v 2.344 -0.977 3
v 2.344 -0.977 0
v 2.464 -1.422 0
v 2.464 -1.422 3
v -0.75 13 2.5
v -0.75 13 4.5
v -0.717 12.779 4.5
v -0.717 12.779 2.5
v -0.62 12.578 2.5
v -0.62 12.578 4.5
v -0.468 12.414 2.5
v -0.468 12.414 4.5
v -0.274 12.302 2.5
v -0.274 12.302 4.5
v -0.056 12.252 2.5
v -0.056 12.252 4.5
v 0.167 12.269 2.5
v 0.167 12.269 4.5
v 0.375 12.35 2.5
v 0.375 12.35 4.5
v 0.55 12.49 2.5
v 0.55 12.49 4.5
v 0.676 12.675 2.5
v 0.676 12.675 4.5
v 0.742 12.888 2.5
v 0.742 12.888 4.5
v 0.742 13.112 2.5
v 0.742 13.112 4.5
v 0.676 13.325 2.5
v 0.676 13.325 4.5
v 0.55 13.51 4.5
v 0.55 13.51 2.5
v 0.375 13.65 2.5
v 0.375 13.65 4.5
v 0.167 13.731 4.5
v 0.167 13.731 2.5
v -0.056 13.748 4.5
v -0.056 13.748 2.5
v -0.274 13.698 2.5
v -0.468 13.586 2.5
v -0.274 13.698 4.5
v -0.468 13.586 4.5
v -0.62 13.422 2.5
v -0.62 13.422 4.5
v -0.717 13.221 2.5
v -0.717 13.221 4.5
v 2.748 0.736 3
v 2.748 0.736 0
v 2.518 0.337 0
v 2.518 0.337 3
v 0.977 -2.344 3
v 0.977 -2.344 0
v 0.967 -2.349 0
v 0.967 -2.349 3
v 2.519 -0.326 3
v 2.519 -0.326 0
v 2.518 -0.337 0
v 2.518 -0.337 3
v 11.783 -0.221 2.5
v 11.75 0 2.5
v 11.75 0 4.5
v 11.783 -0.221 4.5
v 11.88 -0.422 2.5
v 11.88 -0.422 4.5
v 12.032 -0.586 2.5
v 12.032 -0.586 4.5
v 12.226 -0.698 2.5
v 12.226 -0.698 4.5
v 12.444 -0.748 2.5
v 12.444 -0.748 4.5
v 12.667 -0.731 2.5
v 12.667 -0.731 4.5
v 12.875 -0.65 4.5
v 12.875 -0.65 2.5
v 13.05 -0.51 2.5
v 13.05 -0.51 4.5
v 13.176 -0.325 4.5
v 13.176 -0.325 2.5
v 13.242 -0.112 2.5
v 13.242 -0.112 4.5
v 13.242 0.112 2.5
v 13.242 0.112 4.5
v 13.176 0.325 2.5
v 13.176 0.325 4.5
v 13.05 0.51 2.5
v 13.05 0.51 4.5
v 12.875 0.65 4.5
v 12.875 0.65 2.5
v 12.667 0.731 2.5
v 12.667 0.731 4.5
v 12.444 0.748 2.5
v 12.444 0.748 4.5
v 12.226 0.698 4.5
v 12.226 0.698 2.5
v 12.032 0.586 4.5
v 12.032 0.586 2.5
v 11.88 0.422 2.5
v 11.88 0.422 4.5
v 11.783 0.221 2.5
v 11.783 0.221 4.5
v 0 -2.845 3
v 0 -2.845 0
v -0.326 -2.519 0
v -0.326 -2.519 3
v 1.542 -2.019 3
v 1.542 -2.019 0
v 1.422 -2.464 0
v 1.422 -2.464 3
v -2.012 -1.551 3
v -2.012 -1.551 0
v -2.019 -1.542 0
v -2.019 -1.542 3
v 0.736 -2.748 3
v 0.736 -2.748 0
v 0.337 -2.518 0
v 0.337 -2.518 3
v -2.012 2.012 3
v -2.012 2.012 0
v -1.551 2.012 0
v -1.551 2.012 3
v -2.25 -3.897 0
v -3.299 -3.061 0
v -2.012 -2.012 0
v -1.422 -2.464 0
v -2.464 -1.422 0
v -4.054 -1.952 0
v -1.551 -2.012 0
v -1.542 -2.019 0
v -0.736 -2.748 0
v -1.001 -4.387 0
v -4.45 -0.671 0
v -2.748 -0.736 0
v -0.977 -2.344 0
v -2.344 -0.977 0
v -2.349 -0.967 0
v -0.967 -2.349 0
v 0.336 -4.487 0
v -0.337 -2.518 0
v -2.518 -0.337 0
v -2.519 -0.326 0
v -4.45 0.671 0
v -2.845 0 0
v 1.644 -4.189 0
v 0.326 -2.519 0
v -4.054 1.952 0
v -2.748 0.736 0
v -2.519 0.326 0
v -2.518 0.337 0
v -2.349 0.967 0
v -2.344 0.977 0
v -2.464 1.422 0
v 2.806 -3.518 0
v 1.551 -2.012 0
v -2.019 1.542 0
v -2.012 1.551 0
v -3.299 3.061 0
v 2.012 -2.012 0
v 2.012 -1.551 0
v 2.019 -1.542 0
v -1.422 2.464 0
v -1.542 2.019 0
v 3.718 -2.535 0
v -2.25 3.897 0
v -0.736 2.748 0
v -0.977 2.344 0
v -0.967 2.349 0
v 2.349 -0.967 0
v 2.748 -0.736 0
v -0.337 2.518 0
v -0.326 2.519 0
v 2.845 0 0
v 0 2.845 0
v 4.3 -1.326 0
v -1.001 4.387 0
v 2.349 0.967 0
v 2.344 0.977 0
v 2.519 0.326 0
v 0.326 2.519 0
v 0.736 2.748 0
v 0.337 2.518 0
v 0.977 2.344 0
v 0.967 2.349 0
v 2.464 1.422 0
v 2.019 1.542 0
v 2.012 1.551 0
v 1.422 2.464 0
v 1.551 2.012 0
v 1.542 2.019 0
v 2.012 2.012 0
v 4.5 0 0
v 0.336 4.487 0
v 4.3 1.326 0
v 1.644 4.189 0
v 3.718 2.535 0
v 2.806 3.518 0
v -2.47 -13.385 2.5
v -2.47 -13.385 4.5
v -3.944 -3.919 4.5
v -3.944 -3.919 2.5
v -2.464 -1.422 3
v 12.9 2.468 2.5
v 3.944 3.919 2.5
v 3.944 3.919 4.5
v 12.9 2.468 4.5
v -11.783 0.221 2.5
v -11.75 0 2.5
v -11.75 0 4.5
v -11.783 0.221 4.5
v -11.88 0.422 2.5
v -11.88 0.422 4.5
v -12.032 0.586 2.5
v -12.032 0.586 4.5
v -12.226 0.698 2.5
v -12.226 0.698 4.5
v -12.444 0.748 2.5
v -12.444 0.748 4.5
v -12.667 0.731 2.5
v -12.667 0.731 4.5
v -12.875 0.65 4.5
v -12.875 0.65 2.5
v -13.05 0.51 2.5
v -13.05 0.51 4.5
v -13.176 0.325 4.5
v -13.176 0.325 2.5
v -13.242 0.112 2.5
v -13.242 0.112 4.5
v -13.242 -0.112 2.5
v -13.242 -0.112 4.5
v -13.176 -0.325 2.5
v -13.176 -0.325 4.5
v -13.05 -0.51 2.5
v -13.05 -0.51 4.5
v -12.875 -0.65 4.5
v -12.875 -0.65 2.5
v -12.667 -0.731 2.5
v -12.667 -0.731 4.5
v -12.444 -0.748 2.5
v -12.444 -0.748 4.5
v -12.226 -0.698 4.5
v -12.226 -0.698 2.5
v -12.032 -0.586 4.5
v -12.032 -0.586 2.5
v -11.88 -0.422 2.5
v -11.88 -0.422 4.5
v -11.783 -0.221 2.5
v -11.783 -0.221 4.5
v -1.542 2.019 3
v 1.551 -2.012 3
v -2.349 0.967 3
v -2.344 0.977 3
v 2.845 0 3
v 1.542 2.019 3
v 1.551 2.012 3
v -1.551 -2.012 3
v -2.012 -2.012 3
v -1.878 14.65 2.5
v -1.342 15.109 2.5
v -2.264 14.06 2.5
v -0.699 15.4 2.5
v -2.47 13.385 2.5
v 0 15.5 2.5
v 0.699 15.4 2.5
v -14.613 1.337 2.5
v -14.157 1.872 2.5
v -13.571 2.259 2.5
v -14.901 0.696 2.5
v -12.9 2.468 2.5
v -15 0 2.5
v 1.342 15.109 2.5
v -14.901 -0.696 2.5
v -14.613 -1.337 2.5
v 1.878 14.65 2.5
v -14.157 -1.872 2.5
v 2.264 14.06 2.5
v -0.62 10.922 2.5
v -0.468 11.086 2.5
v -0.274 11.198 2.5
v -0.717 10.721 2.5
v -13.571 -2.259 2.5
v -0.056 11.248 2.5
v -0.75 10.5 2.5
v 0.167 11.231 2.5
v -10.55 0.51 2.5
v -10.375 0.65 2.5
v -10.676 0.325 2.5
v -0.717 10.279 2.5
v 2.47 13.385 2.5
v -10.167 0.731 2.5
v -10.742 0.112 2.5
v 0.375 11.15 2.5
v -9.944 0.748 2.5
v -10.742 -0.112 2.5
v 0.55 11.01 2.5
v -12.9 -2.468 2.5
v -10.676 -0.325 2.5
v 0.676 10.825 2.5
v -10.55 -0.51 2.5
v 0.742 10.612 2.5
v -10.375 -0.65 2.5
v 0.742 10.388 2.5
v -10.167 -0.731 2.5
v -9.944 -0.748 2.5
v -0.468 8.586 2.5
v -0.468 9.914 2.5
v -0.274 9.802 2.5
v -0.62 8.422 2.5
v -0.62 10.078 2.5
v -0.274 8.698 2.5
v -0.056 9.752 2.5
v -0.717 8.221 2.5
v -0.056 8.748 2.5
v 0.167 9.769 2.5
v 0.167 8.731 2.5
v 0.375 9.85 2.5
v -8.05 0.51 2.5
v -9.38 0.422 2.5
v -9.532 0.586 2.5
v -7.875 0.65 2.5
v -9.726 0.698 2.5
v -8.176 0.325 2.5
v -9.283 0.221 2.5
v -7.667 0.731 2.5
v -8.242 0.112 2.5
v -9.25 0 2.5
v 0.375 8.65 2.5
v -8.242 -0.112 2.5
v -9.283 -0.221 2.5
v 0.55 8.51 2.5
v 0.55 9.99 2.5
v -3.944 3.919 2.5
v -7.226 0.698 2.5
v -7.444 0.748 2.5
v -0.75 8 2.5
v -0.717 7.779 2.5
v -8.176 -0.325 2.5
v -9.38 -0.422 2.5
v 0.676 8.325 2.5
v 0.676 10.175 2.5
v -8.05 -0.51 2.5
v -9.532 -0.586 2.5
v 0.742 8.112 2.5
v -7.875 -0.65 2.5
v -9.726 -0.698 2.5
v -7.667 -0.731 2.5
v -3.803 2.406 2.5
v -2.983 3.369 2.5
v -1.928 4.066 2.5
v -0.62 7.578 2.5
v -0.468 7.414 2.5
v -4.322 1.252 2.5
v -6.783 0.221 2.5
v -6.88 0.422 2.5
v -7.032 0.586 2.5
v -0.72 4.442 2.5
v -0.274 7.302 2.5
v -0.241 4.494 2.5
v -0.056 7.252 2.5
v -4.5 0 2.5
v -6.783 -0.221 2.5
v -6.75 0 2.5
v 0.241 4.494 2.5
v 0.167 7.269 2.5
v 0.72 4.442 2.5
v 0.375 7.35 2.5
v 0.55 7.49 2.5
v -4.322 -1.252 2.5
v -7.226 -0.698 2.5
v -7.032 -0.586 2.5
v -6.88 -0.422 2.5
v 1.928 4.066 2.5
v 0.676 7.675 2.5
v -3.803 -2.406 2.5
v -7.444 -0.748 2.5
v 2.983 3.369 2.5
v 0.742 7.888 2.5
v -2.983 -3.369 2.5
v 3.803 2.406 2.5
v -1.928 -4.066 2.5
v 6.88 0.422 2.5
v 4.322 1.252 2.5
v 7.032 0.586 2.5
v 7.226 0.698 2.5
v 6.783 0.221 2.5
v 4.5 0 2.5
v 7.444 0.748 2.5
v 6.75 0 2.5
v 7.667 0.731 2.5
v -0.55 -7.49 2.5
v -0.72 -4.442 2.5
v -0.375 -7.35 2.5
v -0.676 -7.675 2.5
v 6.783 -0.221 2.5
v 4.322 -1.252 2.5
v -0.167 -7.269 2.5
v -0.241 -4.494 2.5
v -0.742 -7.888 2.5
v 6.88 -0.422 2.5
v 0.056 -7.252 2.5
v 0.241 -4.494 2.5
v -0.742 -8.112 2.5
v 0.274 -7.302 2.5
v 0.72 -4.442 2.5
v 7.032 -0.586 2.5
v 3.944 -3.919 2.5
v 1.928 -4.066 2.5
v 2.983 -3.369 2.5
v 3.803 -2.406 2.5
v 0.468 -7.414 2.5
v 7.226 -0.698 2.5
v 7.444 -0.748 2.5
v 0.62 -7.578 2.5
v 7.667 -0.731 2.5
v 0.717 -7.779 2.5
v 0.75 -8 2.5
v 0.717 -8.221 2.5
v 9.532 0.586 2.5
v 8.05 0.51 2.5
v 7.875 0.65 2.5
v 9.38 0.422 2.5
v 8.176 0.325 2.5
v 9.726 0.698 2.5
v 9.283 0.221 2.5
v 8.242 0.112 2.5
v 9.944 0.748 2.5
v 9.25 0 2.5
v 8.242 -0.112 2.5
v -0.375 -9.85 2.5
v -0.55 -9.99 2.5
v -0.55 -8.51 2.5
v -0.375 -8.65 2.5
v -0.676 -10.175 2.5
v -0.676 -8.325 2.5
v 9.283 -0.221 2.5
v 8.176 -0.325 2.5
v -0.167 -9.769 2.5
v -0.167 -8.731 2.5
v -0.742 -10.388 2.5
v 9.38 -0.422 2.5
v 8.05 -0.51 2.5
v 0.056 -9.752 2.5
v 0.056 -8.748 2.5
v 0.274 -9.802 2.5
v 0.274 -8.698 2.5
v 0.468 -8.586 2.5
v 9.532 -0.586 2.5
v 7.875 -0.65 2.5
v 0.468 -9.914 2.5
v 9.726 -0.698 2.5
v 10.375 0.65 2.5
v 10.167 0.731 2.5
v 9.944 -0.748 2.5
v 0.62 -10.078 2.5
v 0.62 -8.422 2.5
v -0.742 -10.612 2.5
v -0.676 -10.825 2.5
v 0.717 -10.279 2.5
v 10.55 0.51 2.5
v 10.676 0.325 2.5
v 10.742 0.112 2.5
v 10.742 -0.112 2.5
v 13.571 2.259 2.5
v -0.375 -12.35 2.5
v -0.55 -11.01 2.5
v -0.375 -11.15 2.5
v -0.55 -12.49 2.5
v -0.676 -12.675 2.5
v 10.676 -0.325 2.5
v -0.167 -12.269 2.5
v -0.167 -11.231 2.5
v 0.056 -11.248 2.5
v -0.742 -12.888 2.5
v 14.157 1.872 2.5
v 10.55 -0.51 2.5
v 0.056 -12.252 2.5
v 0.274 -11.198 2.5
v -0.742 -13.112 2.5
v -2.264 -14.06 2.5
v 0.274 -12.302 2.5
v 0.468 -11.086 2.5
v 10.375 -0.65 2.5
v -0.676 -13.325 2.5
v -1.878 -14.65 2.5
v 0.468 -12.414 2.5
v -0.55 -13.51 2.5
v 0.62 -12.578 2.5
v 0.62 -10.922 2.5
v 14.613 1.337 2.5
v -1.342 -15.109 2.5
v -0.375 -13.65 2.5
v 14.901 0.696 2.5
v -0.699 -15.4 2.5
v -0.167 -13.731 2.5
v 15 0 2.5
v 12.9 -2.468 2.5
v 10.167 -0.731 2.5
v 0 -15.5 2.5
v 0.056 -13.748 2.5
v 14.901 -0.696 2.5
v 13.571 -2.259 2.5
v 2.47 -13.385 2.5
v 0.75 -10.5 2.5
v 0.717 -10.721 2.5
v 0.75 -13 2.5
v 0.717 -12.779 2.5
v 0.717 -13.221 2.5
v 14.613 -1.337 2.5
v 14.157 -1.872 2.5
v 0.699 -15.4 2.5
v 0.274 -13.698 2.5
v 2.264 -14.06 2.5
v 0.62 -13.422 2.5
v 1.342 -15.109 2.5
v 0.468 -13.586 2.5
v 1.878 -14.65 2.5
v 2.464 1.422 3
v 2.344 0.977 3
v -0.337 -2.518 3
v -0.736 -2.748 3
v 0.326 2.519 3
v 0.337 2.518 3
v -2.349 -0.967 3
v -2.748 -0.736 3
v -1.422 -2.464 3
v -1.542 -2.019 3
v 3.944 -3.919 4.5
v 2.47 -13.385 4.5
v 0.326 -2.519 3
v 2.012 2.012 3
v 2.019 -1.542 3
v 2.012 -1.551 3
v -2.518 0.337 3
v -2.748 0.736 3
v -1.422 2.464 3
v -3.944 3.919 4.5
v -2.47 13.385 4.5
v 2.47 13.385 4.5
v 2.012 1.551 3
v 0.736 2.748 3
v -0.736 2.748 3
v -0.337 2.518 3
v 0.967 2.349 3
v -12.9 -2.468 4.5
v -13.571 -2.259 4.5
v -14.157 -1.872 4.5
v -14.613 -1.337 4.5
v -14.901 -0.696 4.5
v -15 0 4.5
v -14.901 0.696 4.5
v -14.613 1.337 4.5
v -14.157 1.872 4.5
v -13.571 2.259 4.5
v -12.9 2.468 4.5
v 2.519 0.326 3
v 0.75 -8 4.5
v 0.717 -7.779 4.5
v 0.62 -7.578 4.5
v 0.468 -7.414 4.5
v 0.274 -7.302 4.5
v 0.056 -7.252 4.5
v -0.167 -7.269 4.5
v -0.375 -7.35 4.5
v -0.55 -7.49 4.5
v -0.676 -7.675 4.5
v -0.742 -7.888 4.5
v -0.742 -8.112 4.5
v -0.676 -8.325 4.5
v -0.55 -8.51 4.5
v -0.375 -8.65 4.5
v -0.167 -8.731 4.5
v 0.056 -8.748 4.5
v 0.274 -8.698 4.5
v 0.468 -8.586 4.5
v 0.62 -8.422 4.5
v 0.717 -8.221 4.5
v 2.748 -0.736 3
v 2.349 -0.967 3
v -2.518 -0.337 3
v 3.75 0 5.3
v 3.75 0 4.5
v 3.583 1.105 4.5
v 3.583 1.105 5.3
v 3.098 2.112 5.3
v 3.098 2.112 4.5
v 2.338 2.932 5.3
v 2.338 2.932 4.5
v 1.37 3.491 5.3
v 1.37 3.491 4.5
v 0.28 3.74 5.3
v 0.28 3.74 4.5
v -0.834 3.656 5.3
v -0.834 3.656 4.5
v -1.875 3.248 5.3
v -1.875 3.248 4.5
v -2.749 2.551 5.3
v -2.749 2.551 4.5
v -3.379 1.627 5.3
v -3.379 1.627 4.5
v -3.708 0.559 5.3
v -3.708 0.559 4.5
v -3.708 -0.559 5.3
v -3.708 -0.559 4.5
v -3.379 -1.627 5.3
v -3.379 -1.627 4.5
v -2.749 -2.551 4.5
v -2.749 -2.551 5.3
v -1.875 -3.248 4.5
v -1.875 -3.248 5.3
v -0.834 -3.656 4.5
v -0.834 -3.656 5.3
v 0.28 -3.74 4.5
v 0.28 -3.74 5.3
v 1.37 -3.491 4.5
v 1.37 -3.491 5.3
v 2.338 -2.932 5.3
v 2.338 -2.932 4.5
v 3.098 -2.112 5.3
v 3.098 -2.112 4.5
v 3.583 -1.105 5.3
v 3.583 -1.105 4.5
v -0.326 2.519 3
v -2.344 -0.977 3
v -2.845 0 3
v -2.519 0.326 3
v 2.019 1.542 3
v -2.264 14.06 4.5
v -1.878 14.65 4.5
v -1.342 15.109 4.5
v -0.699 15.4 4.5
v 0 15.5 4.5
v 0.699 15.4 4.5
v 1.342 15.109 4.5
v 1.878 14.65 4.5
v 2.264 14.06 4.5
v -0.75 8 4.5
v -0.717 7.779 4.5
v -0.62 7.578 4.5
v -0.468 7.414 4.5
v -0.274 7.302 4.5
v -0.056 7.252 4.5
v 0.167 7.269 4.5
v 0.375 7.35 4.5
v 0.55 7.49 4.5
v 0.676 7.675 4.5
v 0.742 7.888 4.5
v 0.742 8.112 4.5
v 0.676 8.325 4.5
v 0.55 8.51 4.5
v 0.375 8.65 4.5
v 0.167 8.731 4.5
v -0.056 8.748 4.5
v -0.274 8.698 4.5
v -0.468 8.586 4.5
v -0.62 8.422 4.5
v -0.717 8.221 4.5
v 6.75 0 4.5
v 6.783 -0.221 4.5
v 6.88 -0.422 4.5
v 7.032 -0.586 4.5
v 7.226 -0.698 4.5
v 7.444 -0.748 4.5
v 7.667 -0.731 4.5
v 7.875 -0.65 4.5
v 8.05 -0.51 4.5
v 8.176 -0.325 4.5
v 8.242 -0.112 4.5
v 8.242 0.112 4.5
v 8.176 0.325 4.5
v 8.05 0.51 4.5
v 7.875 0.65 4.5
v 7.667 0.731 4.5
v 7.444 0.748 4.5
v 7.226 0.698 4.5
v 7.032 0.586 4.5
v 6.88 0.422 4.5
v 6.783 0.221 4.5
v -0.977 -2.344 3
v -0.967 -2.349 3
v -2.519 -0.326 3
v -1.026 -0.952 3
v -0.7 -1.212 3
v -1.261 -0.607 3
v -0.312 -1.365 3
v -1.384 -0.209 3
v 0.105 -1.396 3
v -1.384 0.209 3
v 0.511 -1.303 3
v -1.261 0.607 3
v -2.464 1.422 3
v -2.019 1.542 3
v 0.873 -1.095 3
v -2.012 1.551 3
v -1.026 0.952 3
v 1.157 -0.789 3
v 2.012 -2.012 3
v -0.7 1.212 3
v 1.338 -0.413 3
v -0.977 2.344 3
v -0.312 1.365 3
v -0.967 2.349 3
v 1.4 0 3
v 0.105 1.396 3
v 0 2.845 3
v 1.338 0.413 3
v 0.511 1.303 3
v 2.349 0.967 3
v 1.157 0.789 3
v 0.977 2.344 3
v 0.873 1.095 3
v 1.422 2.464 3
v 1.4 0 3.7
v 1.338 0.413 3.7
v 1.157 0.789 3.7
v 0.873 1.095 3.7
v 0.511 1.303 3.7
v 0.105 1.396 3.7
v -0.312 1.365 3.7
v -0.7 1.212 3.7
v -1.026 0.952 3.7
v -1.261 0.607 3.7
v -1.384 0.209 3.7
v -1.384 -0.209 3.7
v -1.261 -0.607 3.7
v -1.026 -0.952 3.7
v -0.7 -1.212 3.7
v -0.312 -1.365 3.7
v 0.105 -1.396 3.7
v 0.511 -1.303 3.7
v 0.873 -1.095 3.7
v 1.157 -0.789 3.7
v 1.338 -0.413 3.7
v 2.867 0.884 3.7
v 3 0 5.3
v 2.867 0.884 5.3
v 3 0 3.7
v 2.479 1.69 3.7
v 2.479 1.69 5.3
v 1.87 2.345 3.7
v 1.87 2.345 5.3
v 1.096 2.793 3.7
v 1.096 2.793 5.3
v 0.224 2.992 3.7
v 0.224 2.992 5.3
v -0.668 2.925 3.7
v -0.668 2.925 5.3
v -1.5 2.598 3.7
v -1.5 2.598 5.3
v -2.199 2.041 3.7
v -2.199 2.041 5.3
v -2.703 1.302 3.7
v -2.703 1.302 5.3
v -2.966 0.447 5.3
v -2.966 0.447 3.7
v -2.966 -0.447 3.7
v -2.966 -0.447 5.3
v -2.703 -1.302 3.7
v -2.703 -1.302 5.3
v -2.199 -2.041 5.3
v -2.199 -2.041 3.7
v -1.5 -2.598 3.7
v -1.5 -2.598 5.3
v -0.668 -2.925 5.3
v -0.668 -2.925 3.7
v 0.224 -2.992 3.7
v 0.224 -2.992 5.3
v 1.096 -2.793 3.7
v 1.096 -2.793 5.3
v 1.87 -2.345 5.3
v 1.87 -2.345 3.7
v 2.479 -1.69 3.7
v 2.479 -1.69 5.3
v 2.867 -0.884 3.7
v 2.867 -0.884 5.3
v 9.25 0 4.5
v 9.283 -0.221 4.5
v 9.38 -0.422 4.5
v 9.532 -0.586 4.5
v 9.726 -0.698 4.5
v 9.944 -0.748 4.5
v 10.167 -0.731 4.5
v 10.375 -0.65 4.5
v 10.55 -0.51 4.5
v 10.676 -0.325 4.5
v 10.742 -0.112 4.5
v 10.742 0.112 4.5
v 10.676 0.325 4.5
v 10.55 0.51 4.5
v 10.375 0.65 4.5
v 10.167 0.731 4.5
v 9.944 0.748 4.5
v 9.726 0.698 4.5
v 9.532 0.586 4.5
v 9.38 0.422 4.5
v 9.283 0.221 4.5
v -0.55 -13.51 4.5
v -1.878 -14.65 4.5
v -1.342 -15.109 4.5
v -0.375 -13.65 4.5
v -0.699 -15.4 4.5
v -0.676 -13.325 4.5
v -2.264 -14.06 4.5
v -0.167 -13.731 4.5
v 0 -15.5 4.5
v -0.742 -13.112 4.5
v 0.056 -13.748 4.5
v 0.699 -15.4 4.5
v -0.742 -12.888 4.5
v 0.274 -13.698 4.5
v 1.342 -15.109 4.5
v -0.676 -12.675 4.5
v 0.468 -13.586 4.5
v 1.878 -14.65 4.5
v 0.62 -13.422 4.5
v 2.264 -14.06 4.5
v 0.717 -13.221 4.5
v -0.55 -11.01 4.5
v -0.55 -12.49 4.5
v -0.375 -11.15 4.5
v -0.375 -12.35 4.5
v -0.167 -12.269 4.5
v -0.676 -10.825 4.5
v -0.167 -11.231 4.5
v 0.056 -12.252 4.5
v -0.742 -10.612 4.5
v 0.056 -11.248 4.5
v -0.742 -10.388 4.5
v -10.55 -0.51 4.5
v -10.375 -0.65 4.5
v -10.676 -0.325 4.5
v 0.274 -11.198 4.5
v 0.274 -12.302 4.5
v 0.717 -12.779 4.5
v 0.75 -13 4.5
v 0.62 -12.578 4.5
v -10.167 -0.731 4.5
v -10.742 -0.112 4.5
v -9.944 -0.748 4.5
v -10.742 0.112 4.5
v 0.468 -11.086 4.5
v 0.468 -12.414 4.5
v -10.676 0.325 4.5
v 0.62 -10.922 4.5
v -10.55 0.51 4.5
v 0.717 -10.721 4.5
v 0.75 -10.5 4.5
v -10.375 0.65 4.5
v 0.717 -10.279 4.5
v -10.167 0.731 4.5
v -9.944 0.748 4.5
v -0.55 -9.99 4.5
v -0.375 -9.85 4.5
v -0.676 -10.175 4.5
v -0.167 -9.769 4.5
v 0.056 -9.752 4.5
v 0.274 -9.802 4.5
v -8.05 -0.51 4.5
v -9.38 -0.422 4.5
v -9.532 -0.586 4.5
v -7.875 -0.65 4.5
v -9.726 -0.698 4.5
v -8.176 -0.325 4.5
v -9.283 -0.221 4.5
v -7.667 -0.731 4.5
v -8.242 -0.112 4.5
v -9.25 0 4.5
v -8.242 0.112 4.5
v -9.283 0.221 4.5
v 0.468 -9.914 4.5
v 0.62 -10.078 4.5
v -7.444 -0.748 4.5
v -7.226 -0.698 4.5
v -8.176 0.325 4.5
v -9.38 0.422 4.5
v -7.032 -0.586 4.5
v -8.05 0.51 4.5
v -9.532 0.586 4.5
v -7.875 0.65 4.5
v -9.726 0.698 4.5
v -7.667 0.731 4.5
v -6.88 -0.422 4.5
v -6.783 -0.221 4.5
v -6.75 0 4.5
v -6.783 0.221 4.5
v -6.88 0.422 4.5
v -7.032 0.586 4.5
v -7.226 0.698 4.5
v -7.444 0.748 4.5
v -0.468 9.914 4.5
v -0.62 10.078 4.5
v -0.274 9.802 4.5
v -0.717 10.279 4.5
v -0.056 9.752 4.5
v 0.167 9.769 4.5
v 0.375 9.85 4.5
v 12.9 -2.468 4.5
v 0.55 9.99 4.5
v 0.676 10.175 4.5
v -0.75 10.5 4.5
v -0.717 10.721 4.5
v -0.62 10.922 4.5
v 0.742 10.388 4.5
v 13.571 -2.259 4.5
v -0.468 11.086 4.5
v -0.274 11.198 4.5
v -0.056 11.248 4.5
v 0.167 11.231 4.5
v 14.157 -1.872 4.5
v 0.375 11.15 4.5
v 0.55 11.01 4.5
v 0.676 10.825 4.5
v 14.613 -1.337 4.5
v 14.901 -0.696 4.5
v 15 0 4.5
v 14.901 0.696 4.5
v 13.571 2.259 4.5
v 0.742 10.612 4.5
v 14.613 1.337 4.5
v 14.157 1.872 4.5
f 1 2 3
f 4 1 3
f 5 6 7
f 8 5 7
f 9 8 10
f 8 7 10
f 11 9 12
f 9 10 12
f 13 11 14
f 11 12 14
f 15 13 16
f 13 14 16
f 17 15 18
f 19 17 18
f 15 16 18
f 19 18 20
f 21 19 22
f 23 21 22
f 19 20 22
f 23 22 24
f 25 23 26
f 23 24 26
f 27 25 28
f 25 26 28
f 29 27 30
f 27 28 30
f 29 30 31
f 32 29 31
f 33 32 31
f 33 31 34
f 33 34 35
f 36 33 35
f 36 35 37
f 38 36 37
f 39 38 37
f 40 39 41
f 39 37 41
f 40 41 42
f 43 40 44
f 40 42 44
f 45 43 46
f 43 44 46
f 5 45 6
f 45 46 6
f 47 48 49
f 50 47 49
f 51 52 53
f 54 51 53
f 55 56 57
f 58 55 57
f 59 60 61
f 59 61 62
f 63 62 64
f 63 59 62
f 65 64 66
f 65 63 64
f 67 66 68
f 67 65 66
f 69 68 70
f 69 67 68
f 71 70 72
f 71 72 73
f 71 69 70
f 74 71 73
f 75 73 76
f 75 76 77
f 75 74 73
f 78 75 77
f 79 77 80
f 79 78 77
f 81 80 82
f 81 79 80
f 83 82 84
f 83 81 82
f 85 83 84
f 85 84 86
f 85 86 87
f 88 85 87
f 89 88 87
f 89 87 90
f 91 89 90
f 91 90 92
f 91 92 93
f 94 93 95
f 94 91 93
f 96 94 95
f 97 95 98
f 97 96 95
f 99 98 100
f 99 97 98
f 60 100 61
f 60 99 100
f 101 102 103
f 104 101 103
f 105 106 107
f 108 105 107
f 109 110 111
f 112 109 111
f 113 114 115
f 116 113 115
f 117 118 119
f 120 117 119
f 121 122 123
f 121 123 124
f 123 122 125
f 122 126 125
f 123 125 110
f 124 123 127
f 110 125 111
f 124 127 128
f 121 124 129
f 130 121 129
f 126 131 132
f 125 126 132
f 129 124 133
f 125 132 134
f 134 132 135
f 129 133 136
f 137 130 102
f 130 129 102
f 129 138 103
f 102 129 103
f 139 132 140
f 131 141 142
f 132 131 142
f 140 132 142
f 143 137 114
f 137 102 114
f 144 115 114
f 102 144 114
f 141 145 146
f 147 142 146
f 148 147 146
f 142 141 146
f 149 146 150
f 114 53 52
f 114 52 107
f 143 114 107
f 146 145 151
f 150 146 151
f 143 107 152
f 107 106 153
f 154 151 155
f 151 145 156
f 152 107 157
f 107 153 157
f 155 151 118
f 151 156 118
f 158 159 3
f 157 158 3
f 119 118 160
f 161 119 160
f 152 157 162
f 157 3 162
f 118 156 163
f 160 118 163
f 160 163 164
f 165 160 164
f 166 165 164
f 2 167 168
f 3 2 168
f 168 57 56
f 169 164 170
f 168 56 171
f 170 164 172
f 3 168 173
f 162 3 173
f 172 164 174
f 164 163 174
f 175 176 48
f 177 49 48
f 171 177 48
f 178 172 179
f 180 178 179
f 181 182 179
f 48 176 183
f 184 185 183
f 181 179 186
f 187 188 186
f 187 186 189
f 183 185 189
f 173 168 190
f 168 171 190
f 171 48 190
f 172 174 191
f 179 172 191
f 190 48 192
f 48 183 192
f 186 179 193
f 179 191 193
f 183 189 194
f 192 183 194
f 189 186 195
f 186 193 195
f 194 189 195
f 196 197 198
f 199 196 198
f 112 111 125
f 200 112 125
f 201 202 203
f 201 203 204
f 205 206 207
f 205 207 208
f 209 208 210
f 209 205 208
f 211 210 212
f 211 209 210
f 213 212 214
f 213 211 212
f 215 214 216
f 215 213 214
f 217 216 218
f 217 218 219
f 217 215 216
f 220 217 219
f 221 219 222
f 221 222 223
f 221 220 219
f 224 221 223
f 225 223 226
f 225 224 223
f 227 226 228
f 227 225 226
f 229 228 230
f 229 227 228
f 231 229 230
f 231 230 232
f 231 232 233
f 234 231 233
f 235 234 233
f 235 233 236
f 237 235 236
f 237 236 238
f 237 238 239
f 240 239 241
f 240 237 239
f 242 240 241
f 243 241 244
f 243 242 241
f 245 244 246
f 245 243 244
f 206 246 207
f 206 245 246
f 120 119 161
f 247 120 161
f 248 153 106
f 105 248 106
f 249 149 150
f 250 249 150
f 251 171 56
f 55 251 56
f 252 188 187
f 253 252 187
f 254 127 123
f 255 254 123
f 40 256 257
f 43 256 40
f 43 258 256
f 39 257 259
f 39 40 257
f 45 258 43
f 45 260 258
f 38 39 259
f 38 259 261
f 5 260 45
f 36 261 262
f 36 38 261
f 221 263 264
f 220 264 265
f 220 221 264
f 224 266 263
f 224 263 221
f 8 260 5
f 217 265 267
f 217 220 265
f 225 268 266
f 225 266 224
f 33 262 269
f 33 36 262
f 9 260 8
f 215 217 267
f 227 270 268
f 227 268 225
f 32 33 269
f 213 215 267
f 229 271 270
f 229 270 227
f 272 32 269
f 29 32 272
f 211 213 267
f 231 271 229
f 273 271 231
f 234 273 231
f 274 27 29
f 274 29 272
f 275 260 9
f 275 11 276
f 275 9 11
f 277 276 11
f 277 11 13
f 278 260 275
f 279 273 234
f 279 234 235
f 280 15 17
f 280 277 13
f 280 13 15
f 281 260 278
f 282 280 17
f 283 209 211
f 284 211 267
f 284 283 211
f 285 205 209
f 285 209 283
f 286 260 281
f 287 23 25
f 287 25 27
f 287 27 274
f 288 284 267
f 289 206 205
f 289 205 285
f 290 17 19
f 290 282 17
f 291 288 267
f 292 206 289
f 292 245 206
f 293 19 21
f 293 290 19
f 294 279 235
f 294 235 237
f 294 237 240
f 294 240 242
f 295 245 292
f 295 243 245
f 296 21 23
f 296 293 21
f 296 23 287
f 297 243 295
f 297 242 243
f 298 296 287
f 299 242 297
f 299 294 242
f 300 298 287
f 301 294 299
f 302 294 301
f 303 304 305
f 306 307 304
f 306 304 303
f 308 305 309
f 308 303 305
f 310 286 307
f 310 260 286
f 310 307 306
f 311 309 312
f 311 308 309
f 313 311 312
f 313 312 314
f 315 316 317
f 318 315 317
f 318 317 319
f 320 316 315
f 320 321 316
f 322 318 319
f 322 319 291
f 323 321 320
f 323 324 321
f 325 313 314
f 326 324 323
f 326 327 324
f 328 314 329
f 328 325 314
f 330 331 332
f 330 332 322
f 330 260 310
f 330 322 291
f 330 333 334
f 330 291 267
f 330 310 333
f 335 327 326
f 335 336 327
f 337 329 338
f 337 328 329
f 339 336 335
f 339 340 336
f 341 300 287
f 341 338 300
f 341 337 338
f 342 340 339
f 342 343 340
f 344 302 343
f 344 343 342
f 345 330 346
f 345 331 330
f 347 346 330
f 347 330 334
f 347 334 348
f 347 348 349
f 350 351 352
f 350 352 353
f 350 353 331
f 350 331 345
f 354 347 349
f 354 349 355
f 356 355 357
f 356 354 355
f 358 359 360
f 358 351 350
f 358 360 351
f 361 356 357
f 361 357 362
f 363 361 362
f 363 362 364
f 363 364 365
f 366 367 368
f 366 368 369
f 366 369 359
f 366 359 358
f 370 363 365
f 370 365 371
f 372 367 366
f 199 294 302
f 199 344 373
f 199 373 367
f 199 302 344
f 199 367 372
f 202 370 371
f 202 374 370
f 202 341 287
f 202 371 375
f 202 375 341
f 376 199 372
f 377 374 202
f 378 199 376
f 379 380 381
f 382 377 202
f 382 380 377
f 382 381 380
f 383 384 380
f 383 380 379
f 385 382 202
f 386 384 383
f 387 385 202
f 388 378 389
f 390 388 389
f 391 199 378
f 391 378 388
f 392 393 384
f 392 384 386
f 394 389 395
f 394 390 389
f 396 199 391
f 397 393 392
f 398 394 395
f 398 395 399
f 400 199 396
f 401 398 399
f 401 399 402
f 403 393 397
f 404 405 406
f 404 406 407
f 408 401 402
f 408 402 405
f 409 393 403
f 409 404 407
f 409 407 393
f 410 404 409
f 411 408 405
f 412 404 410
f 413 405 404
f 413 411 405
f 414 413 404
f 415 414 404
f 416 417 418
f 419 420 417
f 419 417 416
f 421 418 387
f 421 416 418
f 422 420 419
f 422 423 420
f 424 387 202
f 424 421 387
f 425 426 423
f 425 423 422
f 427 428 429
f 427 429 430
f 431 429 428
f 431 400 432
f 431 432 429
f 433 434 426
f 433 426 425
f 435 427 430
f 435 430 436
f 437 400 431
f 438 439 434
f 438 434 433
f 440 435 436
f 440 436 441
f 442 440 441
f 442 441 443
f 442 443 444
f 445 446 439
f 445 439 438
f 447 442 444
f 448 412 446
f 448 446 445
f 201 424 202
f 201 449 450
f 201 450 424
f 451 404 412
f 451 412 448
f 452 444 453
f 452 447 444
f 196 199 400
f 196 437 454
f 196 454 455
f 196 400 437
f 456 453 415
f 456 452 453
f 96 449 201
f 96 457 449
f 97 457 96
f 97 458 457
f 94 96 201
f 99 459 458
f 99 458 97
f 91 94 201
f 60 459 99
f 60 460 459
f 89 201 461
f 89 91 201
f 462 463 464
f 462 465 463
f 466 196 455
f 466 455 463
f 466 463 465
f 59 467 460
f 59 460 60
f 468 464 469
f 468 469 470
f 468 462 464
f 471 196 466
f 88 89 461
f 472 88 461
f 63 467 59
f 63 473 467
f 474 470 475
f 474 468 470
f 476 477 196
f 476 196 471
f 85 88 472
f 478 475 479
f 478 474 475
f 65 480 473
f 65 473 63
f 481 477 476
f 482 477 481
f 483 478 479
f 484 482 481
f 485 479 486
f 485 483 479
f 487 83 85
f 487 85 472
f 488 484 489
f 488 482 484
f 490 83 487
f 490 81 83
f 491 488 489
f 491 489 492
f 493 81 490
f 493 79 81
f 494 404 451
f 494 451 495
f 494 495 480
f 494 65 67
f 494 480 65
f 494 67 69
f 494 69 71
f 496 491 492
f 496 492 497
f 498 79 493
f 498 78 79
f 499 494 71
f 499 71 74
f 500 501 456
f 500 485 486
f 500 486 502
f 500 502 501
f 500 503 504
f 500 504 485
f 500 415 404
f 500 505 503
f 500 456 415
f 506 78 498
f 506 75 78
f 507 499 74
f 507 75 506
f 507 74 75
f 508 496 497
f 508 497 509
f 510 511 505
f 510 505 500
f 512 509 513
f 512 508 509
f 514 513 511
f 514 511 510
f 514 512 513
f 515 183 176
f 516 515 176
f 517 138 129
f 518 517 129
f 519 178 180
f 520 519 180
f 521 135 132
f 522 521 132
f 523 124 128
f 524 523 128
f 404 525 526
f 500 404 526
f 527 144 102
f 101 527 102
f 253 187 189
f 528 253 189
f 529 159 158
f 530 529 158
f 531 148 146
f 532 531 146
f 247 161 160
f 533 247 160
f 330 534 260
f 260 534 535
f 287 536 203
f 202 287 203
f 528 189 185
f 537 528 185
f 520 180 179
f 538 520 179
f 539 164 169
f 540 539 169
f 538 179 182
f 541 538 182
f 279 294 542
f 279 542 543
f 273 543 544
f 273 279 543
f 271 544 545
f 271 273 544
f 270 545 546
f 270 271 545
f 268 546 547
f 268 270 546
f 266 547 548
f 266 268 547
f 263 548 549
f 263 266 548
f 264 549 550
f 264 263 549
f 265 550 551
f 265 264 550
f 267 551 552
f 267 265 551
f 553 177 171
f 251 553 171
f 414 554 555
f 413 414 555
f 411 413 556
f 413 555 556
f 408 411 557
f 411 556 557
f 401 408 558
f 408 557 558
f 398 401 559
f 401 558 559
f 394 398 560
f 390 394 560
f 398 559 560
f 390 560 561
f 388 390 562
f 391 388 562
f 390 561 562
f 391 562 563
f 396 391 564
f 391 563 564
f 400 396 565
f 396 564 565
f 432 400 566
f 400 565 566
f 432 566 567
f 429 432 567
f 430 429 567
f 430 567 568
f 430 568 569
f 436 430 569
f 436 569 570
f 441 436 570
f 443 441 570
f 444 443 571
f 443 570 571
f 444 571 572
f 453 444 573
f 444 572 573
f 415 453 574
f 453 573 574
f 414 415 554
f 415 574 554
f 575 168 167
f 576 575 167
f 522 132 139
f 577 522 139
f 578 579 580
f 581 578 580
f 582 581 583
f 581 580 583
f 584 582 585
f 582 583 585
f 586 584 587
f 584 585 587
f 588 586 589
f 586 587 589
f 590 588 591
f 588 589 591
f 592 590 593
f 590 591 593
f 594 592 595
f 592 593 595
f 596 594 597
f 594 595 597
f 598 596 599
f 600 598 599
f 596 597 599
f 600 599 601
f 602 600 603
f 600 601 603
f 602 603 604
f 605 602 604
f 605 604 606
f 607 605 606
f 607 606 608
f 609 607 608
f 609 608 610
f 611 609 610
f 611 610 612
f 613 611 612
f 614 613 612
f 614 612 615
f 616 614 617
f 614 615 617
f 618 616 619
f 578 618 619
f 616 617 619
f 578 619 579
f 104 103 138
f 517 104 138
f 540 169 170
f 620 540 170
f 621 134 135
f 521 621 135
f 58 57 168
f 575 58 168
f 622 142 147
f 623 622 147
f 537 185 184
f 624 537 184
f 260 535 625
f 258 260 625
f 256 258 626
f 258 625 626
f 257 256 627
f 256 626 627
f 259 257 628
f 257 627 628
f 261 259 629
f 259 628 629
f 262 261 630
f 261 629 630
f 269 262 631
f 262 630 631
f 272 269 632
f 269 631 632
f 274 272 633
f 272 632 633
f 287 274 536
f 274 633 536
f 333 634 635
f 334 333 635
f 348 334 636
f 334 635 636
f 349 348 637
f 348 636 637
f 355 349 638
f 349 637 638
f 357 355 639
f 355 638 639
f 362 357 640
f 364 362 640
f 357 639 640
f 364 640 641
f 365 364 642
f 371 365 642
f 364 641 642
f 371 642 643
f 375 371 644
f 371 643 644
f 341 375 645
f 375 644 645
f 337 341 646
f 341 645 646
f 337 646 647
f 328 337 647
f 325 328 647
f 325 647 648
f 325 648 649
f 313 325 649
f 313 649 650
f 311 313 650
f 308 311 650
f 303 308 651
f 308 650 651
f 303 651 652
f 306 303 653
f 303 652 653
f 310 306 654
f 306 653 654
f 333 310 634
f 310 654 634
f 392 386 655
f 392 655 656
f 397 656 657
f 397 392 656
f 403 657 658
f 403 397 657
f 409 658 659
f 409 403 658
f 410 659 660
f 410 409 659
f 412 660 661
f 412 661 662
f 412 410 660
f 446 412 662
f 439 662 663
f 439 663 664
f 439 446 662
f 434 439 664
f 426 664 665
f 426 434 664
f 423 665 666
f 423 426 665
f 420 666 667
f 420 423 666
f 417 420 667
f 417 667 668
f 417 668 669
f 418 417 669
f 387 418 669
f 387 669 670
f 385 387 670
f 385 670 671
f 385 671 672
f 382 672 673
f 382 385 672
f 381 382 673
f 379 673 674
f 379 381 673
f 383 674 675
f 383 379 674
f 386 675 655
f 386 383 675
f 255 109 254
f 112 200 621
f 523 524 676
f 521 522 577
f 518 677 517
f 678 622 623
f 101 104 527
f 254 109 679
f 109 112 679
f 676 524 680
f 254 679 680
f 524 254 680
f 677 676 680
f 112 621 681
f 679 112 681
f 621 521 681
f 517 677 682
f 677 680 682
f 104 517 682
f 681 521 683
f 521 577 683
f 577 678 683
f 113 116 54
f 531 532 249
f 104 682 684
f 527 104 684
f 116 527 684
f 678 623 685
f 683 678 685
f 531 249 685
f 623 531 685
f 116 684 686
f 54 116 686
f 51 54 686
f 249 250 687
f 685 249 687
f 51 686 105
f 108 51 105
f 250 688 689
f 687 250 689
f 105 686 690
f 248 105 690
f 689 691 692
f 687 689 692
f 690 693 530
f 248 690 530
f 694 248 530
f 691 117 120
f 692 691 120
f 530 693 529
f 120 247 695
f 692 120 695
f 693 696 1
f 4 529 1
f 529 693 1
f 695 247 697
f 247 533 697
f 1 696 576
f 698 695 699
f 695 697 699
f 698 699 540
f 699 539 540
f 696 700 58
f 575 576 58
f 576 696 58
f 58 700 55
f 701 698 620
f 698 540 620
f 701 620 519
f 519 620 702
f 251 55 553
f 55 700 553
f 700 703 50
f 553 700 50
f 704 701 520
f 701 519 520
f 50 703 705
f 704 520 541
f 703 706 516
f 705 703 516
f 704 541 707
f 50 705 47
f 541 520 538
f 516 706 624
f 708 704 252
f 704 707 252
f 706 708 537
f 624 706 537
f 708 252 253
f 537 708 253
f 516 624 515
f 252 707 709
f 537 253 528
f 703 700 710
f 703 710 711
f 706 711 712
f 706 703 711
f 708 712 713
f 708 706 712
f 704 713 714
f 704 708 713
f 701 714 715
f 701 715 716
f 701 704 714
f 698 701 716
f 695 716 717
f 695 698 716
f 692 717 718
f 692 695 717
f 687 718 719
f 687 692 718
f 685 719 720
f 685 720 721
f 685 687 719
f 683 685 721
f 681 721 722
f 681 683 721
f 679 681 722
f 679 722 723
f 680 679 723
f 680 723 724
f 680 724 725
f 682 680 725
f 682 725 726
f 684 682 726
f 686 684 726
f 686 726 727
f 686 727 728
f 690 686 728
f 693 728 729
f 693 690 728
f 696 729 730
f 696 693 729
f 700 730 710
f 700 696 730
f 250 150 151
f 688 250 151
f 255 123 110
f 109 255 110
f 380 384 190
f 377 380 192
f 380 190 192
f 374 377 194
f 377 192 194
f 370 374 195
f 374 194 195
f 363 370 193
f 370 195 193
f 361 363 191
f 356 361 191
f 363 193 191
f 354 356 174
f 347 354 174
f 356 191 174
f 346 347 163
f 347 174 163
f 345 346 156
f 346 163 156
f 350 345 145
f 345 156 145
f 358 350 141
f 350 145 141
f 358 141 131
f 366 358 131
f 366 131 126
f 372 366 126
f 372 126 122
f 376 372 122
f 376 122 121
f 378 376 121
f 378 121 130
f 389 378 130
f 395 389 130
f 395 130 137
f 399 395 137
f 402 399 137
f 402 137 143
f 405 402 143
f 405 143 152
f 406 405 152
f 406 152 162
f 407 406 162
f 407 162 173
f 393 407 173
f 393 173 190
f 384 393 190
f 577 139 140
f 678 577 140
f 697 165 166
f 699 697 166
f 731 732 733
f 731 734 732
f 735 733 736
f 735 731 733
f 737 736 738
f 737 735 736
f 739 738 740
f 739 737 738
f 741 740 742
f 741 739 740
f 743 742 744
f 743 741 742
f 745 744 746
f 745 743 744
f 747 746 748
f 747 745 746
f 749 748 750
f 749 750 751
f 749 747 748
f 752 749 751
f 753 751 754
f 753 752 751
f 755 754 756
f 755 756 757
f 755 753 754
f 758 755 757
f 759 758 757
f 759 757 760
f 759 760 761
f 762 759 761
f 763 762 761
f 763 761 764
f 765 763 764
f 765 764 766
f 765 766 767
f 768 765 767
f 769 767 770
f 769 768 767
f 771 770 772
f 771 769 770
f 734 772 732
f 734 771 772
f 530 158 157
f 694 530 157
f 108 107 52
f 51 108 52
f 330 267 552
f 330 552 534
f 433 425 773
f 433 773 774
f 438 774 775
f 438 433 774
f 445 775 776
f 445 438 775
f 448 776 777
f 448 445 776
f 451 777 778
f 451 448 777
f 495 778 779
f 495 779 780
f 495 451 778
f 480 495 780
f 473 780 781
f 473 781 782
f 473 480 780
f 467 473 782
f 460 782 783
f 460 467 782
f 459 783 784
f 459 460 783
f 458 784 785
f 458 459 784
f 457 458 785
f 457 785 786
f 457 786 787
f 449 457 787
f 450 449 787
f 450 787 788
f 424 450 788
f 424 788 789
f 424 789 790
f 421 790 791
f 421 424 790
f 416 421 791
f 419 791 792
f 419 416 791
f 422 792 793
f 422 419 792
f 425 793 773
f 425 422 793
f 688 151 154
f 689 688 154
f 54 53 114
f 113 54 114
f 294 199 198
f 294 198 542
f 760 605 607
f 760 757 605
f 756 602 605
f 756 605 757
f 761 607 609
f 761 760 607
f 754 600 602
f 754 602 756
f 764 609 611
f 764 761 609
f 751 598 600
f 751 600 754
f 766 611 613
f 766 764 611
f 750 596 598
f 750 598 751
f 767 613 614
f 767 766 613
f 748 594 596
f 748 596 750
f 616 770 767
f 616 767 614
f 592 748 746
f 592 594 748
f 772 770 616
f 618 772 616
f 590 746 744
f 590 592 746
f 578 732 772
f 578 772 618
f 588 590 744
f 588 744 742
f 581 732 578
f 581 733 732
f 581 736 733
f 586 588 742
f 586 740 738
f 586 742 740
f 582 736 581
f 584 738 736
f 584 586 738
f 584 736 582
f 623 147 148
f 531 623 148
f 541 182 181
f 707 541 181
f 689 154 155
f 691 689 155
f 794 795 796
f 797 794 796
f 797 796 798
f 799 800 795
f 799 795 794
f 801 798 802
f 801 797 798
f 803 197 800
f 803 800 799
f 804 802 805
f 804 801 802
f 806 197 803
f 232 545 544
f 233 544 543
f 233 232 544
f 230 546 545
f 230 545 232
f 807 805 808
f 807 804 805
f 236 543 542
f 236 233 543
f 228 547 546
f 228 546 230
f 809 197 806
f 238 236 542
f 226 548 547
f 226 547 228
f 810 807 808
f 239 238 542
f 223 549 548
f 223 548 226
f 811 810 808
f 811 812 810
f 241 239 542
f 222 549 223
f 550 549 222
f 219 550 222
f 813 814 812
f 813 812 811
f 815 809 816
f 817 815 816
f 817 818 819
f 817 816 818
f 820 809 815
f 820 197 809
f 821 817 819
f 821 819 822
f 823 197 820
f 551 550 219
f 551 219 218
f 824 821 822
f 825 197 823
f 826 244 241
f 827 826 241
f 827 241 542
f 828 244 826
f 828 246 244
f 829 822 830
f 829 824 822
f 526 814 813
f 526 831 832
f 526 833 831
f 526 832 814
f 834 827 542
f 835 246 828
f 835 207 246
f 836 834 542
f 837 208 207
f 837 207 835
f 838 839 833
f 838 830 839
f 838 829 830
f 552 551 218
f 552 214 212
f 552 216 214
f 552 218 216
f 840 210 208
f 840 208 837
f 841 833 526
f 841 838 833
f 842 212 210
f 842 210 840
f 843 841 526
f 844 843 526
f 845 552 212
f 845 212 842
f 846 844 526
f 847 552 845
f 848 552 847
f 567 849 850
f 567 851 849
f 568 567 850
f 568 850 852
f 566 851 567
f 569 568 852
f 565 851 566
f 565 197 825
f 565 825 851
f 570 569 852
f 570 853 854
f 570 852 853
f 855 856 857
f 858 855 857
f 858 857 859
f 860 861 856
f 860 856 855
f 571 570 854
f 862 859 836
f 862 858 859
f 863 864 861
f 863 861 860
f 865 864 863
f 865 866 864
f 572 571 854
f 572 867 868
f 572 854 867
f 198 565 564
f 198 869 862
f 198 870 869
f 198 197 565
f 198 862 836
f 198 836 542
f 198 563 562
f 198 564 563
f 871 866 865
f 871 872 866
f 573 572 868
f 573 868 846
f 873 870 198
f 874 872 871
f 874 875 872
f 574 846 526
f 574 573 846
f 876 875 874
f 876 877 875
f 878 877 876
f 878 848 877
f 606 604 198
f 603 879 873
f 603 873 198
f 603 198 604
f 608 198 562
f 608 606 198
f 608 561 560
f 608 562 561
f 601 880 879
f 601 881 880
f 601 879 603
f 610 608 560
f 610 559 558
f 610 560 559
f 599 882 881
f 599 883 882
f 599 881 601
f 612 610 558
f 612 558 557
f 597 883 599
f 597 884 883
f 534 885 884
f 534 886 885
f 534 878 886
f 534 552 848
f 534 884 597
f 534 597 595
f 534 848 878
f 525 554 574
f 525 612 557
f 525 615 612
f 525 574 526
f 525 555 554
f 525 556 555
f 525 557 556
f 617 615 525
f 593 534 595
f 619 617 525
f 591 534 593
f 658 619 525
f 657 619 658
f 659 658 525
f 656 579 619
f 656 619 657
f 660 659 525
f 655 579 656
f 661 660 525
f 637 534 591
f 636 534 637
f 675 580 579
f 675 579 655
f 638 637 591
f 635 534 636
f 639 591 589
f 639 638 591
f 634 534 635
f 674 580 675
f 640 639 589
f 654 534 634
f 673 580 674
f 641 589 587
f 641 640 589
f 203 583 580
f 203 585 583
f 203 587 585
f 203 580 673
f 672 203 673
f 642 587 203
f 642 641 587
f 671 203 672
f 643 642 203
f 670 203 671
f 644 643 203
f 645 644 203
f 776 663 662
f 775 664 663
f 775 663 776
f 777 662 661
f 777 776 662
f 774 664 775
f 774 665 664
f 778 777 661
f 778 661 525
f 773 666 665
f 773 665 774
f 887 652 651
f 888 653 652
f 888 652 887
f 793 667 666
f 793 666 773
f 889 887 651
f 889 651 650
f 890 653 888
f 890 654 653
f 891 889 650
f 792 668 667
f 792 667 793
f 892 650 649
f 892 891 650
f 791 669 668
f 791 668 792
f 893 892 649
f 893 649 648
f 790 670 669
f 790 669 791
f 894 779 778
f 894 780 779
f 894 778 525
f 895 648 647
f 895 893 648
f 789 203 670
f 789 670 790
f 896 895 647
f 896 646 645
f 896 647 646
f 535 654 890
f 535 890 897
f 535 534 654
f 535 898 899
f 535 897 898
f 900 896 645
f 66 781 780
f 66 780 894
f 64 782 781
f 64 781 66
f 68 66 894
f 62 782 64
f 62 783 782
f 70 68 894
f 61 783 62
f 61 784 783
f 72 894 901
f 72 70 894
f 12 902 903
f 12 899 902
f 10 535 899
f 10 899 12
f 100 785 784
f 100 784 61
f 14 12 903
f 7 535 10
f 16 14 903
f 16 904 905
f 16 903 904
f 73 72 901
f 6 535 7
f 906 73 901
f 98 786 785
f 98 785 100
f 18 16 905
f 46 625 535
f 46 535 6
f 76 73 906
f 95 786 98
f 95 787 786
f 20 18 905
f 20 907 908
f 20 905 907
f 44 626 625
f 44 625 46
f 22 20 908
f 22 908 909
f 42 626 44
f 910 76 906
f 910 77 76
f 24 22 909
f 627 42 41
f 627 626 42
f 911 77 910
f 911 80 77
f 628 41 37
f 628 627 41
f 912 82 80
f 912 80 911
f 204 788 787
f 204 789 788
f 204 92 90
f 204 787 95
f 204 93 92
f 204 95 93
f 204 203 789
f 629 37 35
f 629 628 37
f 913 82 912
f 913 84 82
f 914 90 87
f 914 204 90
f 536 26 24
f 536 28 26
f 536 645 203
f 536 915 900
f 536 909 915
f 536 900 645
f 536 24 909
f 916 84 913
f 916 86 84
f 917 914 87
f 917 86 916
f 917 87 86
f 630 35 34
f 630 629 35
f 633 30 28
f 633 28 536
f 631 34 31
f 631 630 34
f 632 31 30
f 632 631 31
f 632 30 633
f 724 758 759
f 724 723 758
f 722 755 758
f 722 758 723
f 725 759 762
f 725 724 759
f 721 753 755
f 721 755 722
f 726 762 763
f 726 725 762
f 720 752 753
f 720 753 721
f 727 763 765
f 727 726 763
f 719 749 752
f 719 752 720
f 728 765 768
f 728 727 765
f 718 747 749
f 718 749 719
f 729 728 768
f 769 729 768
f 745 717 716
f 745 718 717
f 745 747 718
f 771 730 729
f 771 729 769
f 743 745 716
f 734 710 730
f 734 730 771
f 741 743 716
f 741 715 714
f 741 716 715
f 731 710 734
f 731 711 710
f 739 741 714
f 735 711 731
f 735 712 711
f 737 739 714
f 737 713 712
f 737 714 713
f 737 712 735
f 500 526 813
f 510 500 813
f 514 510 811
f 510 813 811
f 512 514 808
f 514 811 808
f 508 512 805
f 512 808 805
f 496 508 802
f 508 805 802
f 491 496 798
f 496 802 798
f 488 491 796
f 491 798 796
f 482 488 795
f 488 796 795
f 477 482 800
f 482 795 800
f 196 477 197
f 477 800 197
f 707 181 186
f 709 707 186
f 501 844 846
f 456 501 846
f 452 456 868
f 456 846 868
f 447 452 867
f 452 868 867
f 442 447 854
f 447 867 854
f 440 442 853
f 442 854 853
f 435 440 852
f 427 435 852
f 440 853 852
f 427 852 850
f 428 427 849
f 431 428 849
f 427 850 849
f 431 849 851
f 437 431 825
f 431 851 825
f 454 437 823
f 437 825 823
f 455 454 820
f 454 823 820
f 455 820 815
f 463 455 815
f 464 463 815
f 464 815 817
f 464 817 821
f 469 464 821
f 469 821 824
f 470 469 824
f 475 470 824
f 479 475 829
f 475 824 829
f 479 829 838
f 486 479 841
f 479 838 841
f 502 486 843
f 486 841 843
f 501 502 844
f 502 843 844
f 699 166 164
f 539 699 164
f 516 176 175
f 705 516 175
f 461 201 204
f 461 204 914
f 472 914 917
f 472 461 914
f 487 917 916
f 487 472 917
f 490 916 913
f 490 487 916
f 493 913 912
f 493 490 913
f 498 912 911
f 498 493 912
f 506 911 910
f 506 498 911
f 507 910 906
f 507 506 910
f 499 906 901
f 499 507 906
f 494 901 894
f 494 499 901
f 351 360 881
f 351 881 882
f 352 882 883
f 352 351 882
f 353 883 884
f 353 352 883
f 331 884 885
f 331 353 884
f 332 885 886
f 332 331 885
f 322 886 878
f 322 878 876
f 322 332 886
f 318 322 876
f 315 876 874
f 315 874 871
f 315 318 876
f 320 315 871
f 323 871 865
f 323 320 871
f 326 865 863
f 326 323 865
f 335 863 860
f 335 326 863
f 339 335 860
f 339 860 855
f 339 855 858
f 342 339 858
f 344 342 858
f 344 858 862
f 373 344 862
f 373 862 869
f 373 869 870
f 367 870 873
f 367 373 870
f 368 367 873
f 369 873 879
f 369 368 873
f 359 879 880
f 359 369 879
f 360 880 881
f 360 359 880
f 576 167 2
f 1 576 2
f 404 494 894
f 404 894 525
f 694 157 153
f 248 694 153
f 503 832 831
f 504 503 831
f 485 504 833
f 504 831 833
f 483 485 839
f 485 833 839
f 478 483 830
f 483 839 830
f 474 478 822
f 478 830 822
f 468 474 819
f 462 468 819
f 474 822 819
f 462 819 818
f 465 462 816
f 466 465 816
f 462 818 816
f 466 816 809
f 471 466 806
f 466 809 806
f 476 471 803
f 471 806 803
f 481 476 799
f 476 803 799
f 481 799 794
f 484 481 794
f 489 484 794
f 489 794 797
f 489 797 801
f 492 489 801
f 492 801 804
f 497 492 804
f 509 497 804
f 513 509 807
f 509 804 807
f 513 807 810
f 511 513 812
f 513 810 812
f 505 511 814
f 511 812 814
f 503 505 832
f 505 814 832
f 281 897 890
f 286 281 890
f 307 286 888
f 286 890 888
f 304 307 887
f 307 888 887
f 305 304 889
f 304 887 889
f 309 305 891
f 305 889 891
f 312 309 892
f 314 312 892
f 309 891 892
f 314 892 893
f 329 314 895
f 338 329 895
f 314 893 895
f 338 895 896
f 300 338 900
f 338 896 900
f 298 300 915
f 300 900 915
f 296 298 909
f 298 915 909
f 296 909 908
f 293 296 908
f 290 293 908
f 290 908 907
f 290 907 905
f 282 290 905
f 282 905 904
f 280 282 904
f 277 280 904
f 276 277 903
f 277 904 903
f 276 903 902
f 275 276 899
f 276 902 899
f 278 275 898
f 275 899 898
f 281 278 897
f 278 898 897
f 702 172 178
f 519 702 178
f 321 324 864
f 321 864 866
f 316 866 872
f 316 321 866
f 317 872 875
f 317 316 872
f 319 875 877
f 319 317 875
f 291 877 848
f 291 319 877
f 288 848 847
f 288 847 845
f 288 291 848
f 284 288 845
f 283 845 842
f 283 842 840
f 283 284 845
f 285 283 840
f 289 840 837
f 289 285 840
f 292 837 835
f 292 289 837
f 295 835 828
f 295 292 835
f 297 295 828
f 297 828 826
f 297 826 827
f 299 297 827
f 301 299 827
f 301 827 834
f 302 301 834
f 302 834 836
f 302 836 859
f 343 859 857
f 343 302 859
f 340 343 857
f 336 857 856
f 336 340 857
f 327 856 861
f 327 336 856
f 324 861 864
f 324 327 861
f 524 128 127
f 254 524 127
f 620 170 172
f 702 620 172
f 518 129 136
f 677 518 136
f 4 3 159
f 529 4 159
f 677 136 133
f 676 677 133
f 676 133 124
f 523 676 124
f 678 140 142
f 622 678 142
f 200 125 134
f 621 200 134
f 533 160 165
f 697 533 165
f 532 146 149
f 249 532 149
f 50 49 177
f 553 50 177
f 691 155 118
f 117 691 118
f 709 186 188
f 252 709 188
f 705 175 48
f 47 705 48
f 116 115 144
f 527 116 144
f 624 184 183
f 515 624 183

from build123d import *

# Parameters (mm, degrees)
ESQUISSE1_R                  = 4.5
BOSS_EXTRU_1_DEPTH           = 3
BOSS_EXTRU_2_START           = -0.5
ESQUISSE2_R                  = 0.75
BOSS_EXTRU_2_DEPTH           = 2
R_P_TITION_CIRCULAIRE1_COUNT = 2
ESQUISSE3_R                  = 0.75
BOSS_EXTRU_3_DEPTH           = 2
R_P_TITION_CIRCULAIRE2_COUNT = 2
ESQUISSE5_R                  = 4.5
ESQUISSE5_R_2                = 1.4
BOSS_EXTRU_4_DEPTH           = 0.7
ESQUISSE6_R                  = 4.5
ESQUISSE6_R_2                = 3
BOSS_EXTRU_5_DEPTH           = 0.8
ESQUISSE7_R                  = 3.75
ESQUISSE7_R_2                = 3
BOSS_EXTRU_6_DEPTH           = 0.8


with BuildPart() as part:
    # Esquisse1 → Boss.-Extru.1 (new body)
    with BuildSketch(Plane.XY):
        Circle(ESQUISSE1_R)
        Polygon((2.011577371, -1.550856692), (2.011577371, -2.011577371), (1.550856692, -2.011577371), (1.541643286, -2.018647066), (1.4224, -2.463669069), (0.977377998, -2.344425783), (0.966648759, -2.348869979), (0.73628842, -2.747865791), (0.337292608, -2.517505451), (0.325778716, -2.519021284), (0, -2.8448), (-0.325778716, -2.519021284), (-0.337292608, -2.517505451), (-0.73628842, -2.747865791), (-0.966648759, -2.348869979), (-0.977377998, -2.344425783), (-1.4224, -2.463669069), (-1.541643286, -2.018647066), (-1.550856692, -2.011577371), (-2.011577371, -2.011577371), (-2.011577371, -1.550856692), (-2.018647066, -1.541643286), (-2.463669069, -1.4224), (-2.344425783, -0.977377998), (-2.348869979, -0.966648759), (-2.747865791, -0.73628842), (-2.517505451, -0.337292608), (-2.519021284, -0.325778716), (-2.8448, 0), (-2.519021284, 0.325778716), (-2.517505451, 0.337292608), (-2.747865791, 0.73628842), (-2.348869979, 0.966648759), (-2.344425783, 0.977377998), (-2.463669069, 1.4224), (-2.018647066, 1.541643286), (-2.011577371, 1.550856692), (-2.011577371, 2.011577371), (-1.550856692, 2.011577371), (-1.541643286, 2.018647066), (-1.4224, 2.463669069), (-0.977377998, 2.344425783), (-0.966648759, 2.348869979), (-0.73628842, 2.747865791), (-0.337292608, 2.517505451), (-0.325778716, 2.519021284), (0, 2.8448), (0.325778716, 2.519021284), (0.337292608, 2.517505451), (0.73628842, 2.747865791), (0.966648759, 2.348869979), (0.977377998, 2.344425783), (1.4224, 2.463669069), (1.541643286, 2.018647066), (1.550856692, 2.011577371), (2.011577371, 2.011577371), (2.011577371, 1.550856692), (2.018647066, 1.541643286), (2.463669069, 1.4224), (2.344425783, 0.977377998), (2.348869979, 0.966648759), (2.747865791, 0.73628842), (2.517505451, 0.337292608), (2.519021284, 0.325778716), (2.8448, 0), (2.519021284, -0.325778716), (2.517505451, -0.337292608), (2.747865791, -0.73628842), (2.348869979, -0.966648759), (2.344425783, -0.977377998), (2.463669069, -1.4224), (2.018647066, -1.541643286), align=None, mode=Mode.SUBTRACT)
    extrude(amount=BOSS_EXTRU_1_DEPTH)

    # Esquisse2 → Boss.-Extru.2 (add)
    with BuildSketch(Plane.XY.offset(3).offset(BOSS_EXTRU_2_START)):
        with BuildLine():
            Line((-12.9, 2.467792536), (-0.72, 4.442026565))
            ThreePointArc((-0.72, 4.442026565), (-4.5, 0), (-0.72, -4.442026565))
            Line((-0.72, -4.442026565), (-12.9, -2.467792536))
            ThreePointArc((-12.9, -2.467792536), (-15, 0), (-12.9, 2.467792536))
        make_face()
        with Locations((-12.5, 0)):
            Circle(ESQUISSE2_R, mode=Mode.SUBTRACT)
        with Locations((-10, 0)):
            Circle(ESQUISSE2_R, mode=Mode.SUBTRACT)
        with Locations((-7.5, 0)):
            Circle(ESQUISSE2_R, mode=Mode.SUBTRACT)
    boss_extru_2 = extrude(amount=BOSS_EXTRU_2_DEPTH)

    # Répétition circulaire1: Boss.-Extru.2 ×2 about axis
    r_p_tition_circulaire1_axis = Axis((0, 0, 0), (0, 0, 1))
    for i in range(1, R_P_TITION_CIRCULAIRE1_COUNT):
        add(boss_extru_2.rotate(r_p_tition_circulaire1_axis, i * 360 / R_P_TITION_CIRCULAIRE1_COUNT))

    # Esquisse3 → Boss.-Extru.3 (add)
    with BuildSketch(Plane.XY.offset(4.5)):
        with BuildLine():
            Line((4.446426662, -0.692307692), (2.470237034, -13.384615385))
            ThreePointArc((2.470237034, -13.384615385), (0, -15.5), (-2.470237034, -13.384615385))
            Line((-2.470237034, -13.384615385), (-4.446426662, -0.692307692))
            ThreePointArc((-4.446426662, -0.692307692), (0, -4.5), (4.446426662, -0.692307692))
        make_face()
        with Locations((0, -13)):
            Circle(ESQUISSE3_R, mode=Mode.SUBTRACT)
        with Locations((0, -10.5)):
            Circle(ESQUISSE3_R, mode=Mode.SUBTRACT)
        with Locations((0, -8)):
            Circle(ESQUISSE3_R, mode=Mode.SUBTRACT)
    boss_extru_3 = extrude(amount=-BOSS_EXTRU_3_DEPTH)

    # Répétition circulaire2: Boss.-Extru.3 ×2 about axis
    r_p_tition_circulaire2_axis = Axis((0, 0, 0), (0, 0, 1))
    for i in range(1, R_P_TITION_CIRCULAIRE2_COUNT):
        add(boss_extru_3.rotate(r_p_tition_circulaire2_axis, i * 360 / R_P_TITION_CIRCULAIRE2_COUNT))

    # Esquisse5 → Boss.-Extru.4 (add)
    with BuildSketch(Plane.XY.offset(3)):
        Circle(ESQUISSE5_R)
        Circle(ESQUISSE5_R_2, mode=Mode.SUBTRACT)
    extrude(amount=BOSS_EXTRU_4_DEPTH)

    # Esquisse6 → Boss.-Extru.5 (add)
    with BuildSketch(Plane.XY.offset(3.7)):
        Circle(ESQUISSE6_R)
        Circle(ESQUISSE6_R_2, mode=Mode.SUBTRACT)
    extrude(amount=BOSS_EXTRU_5_DEPTH)

    # Esquisse7 → Boss.-Extru.6 (add)
    with BuildSketch(Plane.XY.offset(4.5)):
        Circle(ESQUISSE7_R)
        Circle(ESQUISSE7_R_2, mode=Mode.SUBTRACT)
    extrude(amount=BOSS_EXTRU_6_DEPTH)


solid = part.part
